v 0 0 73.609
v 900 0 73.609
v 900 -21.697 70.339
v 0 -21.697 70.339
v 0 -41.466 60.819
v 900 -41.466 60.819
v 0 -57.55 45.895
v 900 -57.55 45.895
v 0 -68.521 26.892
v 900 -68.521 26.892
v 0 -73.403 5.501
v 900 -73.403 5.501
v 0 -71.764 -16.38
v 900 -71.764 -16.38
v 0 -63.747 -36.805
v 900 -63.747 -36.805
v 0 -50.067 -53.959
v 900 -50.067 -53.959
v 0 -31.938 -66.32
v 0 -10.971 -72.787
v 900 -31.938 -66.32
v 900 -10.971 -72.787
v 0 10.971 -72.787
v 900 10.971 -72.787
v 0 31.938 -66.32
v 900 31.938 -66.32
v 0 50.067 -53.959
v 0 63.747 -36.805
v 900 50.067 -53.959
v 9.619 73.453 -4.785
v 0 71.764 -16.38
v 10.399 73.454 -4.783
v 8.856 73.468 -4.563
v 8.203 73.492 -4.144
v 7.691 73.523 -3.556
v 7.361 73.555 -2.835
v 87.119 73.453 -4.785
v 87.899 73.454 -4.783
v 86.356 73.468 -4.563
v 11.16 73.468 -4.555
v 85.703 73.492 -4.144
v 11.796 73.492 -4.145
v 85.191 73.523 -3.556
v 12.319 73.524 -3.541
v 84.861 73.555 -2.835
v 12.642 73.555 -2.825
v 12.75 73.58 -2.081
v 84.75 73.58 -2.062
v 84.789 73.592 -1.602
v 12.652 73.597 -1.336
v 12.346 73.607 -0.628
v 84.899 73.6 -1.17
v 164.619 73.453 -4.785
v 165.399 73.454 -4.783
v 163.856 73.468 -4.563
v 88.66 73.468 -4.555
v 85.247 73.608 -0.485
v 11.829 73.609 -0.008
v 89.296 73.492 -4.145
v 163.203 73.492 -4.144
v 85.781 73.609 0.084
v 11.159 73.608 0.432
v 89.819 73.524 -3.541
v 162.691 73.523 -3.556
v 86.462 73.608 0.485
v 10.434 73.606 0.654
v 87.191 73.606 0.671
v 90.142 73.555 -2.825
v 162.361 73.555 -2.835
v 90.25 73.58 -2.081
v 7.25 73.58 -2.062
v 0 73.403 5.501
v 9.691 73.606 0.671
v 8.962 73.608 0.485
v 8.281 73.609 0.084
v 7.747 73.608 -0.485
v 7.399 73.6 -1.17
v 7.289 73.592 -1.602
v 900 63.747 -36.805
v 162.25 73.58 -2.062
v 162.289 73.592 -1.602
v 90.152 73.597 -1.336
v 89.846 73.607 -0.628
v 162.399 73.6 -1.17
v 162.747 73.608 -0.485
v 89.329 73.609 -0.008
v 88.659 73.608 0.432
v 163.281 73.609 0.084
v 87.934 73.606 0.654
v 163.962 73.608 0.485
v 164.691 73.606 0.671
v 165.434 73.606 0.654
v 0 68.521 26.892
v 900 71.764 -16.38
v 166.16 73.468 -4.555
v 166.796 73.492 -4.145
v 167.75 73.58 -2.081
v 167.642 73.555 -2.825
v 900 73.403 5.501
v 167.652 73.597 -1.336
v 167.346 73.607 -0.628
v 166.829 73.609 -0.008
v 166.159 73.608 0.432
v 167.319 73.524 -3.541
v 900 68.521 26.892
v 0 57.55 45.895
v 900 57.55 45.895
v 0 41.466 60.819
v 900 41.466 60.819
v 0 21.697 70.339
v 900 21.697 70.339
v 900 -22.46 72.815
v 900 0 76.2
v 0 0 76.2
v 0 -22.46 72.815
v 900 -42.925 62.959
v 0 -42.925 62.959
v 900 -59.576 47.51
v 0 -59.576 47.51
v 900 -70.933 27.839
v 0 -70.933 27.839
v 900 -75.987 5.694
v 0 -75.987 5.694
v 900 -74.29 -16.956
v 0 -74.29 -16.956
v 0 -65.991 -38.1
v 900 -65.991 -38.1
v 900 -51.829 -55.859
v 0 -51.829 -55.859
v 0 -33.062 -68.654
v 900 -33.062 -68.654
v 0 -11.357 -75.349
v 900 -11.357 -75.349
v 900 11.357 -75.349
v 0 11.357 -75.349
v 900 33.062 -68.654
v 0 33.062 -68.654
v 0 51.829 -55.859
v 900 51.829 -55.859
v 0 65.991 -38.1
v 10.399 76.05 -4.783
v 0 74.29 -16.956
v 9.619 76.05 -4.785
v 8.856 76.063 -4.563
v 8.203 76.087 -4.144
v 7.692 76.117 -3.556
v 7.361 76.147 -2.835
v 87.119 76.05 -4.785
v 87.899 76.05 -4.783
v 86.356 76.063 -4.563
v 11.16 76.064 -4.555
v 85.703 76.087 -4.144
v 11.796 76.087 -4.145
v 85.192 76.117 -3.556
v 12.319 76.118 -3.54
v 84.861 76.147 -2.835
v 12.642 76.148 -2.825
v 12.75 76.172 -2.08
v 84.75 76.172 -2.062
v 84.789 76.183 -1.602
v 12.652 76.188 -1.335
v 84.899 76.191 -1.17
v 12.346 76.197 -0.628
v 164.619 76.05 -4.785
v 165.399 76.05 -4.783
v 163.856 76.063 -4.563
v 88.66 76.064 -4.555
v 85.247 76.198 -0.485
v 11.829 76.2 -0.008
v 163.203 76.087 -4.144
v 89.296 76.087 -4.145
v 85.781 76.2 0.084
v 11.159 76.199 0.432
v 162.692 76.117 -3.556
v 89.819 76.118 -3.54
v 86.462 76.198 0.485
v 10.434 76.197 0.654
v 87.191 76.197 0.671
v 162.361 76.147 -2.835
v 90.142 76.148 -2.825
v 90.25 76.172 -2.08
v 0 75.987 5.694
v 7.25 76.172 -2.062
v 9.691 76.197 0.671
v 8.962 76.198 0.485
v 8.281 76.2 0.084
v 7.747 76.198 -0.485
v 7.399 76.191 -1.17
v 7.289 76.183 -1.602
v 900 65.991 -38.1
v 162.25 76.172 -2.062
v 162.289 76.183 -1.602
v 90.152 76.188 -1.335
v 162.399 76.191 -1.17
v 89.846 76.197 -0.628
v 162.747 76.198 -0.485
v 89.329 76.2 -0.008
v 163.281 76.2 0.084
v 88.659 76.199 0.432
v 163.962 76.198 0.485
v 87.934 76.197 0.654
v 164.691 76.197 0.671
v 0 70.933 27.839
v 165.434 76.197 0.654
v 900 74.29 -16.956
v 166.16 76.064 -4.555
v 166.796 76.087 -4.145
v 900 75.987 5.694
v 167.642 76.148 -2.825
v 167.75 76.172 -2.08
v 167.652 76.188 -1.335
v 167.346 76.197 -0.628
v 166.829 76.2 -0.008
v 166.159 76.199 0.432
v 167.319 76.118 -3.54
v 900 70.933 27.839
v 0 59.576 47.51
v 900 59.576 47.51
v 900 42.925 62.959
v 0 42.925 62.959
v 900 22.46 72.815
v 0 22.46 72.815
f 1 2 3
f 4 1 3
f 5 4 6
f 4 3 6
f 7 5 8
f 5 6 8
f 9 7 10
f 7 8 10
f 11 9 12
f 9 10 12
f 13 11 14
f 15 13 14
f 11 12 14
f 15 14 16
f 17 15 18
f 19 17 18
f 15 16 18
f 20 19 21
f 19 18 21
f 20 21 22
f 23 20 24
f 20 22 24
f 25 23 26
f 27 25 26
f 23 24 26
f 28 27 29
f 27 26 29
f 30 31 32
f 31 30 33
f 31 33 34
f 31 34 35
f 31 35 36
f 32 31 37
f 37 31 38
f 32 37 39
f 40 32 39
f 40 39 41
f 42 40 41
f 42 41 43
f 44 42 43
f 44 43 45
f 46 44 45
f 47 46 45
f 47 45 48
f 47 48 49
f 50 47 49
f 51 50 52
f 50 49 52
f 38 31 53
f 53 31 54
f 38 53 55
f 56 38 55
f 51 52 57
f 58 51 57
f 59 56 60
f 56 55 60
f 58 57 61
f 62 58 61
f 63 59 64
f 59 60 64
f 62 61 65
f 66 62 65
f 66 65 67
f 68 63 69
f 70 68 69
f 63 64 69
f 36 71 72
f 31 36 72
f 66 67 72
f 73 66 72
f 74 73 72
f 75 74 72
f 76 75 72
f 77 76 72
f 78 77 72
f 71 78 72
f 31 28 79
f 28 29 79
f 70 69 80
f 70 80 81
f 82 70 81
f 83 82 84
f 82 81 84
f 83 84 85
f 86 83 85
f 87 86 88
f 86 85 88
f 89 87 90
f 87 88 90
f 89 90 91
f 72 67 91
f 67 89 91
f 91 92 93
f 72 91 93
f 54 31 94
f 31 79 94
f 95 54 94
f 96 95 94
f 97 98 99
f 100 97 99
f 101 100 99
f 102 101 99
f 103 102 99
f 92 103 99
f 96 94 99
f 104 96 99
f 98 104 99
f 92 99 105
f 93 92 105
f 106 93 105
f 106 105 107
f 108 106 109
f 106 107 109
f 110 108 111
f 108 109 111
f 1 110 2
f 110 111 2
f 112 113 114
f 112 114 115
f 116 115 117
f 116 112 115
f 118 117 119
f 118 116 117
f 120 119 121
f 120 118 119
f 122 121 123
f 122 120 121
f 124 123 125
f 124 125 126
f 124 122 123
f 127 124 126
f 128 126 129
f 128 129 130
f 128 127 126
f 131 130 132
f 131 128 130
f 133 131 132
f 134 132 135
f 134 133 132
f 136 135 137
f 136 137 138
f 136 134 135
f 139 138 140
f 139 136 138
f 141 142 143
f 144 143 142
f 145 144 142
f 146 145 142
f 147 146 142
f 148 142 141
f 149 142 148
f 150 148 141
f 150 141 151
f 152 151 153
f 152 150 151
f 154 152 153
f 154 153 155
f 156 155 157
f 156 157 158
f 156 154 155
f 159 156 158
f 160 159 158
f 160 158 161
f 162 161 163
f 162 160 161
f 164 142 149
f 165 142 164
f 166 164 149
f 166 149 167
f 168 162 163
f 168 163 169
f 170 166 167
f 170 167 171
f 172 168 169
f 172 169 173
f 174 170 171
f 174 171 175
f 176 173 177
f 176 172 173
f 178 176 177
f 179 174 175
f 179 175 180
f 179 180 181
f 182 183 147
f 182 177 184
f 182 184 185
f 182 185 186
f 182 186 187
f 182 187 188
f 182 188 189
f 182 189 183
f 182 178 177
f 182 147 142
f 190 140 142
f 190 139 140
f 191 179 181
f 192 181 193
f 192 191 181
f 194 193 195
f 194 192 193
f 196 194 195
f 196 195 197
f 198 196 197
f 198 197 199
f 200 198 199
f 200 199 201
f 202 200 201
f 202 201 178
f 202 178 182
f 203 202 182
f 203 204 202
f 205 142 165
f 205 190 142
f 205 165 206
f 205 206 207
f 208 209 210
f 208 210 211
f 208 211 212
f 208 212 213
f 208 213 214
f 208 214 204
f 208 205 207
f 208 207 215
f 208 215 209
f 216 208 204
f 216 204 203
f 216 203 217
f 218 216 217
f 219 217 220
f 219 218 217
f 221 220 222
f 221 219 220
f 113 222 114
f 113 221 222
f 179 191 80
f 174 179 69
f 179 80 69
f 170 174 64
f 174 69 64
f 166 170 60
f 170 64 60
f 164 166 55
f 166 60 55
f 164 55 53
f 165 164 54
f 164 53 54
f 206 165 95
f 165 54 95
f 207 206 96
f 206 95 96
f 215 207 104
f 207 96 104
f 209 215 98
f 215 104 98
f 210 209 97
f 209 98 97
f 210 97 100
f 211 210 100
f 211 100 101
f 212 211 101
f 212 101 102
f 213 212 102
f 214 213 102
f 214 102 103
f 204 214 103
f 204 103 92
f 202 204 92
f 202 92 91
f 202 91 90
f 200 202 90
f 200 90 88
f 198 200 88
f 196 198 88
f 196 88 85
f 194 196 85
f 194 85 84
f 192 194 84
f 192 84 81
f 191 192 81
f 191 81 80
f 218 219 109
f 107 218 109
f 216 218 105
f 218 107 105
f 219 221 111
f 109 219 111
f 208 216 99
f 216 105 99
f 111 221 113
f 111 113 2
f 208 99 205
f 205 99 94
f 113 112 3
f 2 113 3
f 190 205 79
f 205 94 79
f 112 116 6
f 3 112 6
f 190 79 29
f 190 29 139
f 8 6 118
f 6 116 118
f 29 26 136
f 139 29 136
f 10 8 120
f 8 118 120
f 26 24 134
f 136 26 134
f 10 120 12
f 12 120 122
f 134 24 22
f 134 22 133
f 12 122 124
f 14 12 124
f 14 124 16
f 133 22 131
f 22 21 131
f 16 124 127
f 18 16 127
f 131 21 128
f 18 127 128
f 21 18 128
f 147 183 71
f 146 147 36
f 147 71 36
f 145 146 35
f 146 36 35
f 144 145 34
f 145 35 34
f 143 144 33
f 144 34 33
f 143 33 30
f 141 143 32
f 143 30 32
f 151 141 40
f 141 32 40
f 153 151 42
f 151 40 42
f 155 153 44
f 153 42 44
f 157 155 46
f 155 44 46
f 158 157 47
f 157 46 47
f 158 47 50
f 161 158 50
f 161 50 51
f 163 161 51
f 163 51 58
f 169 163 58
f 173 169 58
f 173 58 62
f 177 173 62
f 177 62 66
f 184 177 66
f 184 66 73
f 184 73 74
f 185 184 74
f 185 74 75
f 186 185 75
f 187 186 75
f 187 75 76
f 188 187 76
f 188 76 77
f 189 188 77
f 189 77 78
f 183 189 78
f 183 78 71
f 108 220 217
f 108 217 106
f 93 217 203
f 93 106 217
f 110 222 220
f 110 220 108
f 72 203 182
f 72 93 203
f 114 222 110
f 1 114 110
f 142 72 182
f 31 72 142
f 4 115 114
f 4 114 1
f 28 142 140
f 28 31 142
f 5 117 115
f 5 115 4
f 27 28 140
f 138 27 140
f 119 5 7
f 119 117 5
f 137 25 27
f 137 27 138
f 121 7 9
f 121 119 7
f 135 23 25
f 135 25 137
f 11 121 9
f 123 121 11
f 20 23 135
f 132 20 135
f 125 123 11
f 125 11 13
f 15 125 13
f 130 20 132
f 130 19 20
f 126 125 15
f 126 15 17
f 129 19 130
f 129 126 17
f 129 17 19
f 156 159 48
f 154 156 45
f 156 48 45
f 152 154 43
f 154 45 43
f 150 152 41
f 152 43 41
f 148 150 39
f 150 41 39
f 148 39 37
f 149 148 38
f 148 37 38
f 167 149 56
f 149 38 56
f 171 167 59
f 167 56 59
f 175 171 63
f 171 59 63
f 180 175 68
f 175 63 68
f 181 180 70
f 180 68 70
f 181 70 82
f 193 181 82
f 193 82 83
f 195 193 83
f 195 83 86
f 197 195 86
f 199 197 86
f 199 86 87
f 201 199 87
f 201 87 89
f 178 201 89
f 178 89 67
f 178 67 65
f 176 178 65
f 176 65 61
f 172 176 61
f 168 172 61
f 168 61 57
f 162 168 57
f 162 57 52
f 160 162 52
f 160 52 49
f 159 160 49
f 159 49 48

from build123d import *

# Parameters (mm, degrees)
ESQUISSE1_W          = 900
ESQUISSE1_H          = 2.5908
D_GAGEMENT_M51_D     = 5.5
D_GAGEMENT_M51_DEPTH = 10
D_GAGEMENT_M51_TIP   = 1.652366702


with BuildPart() as part:
    # Esquisse1 → Révolution1 (revolve)
    with BuildSketch(Plane.XY, mode=Mode.PRIVATE) as r_volution1_sk:
        with Locations((450, 74.9046)):
            Rectangle(ESQUISSE1_W, ESQUISSE1_H)
    revolve(r_volution1_sk.sketch.rotate(Axis((0, 0, 0), (1, 0, 0)), 90), axis=Axis((0, 0, 0), (1, 0, 0)))

    # Dégagement M51
    with Locations(Plane(origin=(0, 76.2, 0), x_dir=(1, 0, 0), z_dir=(0, 1, 0))):
        with Locations((165, 2.06190404), (87.5, 2.06190404), (10, 2.06190404)):
            Hole(D_GAGEMENT_M51_D / 2, depth=D_GAGEMENT_M51_DEPTH)
            with Locations((0, 0, -(D_GAGEMENT_M51_DEPTH + D_GAGEMENT_M51_TIP / 2))):  # 118° drill point
                Cone(0, D_GAGEMENT_M51_D / 2, D_GAGEMENT_M51_TIP, mode=Mode.SUBTRACT)


solid = part.part
